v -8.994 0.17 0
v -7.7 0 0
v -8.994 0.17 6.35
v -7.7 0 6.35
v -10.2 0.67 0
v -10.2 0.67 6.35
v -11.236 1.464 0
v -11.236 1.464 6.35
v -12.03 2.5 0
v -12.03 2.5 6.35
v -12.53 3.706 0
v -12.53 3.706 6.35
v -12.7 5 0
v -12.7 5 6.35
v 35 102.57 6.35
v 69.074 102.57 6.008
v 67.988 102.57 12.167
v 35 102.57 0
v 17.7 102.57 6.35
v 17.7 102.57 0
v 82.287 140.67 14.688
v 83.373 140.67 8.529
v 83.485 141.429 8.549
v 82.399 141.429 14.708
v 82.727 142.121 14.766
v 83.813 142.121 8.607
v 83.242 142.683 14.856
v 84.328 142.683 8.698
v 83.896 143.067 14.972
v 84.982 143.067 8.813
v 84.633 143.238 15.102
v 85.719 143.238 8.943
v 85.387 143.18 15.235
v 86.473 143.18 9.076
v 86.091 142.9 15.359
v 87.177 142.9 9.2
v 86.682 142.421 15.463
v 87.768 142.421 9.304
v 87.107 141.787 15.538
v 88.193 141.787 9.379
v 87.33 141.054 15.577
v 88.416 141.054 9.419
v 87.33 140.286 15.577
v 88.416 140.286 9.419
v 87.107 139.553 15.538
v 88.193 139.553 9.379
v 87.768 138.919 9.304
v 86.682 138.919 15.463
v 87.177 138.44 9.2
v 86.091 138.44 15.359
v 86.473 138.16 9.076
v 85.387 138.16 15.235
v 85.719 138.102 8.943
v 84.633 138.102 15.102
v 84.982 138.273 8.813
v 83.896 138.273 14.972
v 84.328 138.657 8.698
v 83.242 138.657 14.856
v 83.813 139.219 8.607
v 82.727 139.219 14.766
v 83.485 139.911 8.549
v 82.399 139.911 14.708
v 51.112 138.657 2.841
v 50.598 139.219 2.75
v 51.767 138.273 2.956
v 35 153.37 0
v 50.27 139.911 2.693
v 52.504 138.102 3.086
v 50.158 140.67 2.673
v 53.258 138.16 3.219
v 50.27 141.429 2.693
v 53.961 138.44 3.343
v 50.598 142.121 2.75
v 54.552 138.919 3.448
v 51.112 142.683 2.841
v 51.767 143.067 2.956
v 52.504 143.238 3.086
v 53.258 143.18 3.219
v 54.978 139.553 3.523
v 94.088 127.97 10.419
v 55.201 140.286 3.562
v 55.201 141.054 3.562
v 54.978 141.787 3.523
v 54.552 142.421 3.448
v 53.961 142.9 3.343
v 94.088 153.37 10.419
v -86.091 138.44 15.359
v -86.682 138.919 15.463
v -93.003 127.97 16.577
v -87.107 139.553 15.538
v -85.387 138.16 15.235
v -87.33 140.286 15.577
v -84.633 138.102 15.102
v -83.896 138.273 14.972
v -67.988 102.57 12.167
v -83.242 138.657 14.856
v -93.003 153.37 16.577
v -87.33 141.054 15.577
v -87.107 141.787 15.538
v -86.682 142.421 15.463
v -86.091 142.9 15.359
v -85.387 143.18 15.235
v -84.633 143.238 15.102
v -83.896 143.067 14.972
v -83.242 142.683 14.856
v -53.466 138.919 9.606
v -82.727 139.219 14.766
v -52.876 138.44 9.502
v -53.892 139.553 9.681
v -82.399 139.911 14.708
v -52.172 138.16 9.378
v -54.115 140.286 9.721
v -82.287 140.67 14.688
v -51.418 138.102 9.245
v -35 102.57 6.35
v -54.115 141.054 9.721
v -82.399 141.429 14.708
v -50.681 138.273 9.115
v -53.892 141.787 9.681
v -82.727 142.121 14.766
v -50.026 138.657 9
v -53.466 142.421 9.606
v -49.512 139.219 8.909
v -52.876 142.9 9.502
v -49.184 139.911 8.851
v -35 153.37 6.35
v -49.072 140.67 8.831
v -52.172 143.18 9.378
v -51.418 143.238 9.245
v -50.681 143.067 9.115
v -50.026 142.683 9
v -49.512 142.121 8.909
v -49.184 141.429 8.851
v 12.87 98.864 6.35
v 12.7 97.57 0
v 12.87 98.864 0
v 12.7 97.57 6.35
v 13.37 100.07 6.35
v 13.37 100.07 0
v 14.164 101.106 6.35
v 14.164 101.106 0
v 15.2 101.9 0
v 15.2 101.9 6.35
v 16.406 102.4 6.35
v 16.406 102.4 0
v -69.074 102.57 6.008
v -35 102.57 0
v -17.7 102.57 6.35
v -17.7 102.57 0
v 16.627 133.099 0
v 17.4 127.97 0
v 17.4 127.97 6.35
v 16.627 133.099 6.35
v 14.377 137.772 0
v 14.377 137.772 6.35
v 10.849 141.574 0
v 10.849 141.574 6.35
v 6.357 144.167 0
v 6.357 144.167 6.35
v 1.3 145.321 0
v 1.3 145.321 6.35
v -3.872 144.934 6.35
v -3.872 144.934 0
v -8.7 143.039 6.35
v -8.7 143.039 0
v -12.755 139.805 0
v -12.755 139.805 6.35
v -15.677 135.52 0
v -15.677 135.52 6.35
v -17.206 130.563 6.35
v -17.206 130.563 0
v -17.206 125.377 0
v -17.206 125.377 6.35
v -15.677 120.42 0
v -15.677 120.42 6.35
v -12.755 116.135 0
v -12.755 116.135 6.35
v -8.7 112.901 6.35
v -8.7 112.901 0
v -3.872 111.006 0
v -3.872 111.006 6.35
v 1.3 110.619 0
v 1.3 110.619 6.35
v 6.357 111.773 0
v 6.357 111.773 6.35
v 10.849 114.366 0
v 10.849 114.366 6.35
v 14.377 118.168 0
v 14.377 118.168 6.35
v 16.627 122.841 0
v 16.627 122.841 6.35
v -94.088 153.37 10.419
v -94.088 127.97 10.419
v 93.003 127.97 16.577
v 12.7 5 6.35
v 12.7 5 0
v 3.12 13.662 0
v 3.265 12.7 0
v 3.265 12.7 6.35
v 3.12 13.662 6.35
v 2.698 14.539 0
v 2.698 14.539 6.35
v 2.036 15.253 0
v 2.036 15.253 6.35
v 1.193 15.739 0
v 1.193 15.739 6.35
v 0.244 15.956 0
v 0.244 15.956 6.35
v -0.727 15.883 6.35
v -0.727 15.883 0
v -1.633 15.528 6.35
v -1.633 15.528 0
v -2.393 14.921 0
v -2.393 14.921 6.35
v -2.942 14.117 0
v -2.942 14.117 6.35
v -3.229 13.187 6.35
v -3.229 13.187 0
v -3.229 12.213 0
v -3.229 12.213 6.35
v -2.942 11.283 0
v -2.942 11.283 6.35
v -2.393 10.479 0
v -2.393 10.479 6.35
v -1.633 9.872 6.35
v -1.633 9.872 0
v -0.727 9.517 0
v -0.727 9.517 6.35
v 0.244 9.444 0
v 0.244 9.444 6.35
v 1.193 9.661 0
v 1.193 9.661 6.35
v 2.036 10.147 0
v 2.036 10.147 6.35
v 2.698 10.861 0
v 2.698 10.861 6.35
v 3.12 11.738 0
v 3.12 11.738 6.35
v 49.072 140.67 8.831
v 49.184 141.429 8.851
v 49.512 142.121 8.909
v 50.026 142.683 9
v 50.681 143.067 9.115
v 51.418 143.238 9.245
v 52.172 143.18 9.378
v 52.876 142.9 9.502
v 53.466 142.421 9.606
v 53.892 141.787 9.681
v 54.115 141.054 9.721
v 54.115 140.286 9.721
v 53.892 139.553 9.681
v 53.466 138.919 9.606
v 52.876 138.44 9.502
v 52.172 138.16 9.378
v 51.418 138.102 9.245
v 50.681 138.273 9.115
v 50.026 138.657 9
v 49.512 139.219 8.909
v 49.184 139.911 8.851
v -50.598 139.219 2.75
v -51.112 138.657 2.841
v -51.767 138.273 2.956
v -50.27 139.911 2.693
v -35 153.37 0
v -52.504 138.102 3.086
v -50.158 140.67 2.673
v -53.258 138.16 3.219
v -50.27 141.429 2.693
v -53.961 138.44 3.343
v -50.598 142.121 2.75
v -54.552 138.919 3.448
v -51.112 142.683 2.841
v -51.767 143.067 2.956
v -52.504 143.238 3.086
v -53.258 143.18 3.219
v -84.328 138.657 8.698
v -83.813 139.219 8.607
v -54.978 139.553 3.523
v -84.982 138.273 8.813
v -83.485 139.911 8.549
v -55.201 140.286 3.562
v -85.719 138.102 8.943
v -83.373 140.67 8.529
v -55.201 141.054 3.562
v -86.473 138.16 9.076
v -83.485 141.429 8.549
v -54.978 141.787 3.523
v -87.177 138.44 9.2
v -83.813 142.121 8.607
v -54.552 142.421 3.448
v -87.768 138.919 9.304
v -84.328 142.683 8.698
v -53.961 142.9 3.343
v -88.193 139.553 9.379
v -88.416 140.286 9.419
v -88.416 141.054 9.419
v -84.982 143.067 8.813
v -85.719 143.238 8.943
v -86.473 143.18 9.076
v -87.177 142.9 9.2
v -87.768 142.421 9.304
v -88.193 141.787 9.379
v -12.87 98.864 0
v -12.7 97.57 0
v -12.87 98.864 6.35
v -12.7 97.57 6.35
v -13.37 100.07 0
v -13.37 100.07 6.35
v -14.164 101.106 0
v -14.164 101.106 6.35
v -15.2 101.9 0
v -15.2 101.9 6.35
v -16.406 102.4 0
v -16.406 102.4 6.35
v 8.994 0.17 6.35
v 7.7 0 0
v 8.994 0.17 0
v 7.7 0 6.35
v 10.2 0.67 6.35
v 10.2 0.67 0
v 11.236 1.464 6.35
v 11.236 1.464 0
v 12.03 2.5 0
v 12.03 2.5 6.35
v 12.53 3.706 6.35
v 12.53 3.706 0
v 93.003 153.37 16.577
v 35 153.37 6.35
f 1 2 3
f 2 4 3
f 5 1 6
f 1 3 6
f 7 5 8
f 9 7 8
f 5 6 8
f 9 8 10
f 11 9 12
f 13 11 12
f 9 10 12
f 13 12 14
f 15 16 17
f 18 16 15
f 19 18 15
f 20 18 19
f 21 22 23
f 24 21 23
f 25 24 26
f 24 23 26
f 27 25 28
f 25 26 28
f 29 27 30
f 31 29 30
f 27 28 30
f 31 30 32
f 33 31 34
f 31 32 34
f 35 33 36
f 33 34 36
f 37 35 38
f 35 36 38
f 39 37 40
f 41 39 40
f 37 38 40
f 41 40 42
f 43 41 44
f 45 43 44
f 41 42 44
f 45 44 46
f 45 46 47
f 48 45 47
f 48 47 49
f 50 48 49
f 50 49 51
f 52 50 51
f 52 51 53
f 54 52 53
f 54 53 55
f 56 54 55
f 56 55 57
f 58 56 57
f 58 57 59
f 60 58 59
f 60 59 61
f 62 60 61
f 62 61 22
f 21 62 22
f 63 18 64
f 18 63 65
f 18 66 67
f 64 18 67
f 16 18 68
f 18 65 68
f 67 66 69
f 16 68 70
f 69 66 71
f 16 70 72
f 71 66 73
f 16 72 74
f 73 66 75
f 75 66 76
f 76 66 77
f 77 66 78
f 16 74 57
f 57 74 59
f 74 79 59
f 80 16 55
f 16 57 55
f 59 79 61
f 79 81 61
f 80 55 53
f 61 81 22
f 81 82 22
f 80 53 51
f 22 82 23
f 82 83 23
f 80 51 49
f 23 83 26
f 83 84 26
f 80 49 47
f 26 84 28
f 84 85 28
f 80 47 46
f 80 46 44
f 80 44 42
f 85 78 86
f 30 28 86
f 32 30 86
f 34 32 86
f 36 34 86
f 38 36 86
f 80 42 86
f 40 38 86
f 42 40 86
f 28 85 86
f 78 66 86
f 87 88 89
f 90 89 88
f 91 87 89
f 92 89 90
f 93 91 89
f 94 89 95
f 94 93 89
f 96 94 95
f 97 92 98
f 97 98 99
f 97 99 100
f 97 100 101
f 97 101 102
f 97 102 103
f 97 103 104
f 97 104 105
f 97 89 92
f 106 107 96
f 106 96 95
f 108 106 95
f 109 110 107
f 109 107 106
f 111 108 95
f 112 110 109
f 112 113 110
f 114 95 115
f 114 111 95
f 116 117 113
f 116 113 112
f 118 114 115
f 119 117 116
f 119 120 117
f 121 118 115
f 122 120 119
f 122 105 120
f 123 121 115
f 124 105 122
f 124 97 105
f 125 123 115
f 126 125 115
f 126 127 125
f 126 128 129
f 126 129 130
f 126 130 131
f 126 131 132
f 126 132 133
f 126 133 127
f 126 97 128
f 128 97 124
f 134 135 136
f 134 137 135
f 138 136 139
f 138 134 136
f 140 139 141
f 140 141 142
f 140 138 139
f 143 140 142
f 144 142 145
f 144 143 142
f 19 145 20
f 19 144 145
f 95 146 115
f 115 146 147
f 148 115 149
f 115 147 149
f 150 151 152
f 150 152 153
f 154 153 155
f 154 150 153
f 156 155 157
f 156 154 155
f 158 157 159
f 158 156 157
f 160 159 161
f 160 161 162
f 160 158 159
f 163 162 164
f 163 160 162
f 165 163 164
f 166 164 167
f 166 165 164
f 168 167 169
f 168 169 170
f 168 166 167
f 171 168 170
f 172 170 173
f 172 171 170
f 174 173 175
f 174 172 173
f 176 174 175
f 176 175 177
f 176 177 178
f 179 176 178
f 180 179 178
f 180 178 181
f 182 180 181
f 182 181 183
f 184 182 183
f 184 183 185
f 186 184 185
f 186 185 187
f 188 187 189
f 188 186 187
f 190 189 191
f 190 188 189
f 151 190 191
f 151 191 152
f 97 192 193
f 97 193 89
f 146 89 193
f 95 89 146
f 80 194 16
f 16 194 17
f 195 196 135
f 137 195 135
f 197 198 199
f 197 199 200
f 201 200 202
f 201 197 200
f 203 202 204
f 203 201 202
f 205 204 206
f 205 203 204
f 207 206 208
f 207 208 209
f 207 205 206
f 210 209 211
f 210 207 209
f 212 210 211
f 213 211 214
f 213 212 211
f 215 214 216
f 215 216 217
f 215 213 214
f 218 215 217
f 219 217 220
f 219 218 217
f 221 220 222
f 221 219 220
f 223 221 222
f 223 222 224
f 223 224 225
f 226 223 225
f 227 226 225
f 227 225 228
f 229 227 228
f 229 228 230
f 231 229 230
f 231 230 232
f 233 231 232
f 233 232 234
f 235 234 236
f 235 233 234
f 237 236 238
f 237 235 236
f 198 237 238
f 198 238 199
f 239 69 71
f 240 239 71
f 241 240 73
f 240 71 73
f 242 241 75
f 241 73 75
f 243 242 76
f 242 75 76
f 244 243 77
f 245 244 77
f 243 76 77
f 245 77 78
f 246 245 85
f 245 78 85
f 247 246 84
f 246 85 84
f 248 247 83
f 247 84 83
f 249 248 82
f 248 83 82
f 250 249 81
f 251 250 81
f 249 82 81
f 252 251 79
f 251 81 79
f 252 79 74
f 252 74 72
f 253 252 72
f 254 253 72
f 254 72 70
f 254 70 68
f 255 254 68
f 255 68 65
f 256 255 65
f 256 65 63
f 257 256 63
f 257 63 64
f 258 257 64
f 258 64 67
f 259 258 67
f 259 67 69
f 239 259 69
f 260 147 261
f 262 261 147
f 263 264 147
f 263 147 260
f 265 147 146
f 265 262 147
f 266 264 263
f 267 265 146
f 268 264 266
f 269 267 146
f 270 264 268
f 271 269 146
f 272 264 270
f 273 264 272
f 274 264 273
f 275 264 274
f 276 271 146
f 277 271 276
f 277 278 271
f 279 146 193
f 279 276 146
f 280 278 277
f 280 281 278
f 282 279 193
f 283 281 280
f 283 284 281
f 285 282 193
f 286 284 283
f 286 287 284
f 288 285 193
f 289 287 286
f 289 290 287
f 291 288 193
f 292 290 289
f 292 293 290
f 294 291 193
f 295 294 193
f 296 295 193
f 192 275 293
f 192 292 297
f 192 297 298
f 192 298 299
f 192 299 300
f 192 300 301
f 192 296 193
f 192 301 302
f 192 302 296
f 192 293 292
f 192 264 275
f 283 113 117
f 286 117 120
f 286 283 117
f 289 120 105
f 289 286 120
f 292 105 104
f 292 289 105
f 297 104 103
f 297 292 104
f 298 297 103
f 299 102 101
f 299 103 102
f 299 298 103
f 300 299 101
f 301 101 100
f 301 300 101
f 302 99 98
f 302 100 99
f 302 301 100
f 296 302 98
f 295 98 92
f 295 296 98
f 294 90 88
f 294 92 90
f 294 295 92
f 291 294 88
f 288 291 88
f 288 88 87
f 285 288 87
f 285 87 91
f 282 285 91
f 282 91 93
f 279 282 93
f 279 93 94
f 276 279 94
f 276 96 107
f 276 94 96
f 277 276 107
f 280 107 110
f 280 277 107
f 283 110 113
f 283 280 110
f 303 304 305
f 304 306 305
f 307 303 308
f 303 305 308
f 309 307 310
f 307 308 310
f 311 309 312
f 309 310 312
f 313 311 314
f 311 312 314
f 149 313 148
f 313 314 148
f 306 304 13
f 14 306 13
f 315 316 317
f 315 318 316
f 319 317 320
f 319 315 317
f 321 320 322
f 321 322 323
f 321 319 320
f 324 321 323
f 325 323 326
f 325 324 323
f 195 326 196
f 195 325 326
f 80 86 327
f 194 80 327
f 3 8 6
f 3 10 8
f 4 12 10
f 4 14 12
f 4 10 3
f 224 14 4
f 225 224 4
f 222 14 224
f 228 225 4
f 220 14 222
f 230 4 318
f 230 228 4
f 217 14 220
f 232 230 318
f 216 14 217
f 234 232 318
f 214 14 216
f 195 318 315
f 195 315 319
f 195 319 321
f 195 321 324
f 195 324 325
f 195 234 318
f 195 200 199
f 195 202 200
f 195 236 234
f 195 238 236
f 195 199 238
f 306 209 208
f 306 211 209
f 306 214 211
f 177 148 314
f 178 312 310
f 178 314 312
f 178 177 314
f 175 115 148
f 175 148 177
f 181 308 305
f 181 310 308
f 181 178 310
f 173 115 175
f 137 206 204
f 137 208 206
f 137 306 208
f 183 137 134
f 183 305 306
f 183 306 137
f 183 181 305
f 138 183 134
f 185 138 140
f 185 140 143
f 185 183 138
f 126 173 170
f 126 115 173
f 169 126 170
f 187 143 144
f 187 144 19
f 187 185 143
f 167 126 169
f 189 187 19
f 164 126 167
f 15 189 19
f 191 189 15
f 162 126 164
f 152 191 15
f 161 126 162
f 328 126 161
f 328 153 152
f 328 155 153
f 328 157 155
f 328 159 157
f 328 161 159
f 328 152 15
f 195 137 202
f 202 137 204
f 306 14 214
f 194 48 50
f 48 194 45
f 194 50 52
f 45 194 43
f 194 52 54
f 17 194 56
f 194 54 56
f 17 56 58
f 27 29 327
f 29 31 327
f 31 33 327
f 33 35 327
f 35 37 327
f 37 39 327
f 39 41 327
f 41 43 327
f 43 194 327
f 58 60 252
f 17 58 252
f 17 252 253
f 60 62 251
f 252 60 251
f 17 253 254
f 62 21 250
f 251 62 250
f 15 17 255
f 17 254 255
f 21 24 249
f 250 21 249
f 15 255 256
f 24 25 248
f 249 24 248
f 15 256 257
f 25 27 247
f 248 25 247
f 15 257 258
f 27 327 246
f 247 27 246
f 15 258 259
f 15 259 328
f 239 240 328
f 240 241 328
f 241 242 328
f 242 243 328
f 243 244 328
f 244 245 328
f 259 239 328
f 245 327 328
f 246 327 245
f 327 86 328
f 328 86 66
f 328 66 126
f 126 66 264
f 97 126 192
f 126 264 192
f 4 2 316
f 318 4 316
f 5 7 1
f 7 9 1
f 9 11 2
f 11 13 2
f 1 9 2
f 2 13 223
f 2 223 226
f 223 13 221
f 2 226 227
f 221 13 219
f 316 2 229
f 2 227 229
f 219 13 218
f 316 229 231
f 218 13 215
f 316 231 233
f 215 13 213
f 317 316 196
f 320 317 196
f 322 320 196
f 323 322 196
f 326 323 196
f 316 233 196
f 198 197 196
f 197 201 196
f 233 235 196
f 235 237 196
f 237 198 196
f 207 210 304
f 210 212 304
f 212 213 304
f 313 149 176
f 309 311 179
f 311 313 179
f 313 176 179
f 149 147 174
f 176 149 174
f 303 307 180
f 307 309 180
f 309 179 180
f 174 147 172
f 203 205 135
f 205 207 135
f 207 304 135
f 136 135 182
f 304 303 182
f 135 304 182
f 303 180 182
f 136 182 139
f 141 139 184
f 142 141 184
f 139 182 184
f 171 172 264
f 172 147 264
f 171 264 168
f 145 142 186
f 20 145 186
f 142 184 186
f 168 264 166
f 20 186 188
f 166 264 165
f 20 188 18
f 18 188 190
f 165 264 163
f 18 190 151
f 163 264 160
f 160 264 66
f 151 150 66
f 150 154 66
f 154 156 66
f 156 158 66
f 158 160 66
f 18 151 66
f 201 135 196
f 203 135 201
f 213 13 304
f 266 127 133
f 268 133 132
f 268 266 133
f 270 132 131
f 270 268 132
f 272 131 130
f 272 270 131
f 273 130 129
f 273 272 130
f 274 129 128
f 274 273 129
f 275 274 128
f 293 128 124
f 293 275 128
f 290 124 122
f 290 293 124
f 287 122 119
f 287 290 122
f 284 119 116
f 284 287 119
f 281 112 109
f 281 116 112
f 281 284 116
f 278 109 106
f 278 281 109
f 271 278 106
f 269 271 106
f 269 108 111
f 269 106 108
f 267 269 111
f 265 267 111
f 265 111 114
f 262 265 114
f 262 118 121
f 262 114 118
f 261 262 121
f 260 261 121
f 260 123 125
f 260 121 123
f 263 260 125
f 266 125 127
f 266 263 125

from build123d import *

# Parameters (mm, degrees)
SKETCH1_R           = 17.4
SKETCH1_R_2         = 3.265
BOSS_EXTRUDE1_DEPTH = 6.35
FILLET2_R           = 5
BOSS_EXTRUDE2_DEPTH = 50.8
CUT_EXTRUDE4_DEPTH  = 181.692673495
SKETCH8_R           = 2.575
CUT_EXTRUDE6_DEPTH  = 10


with BuildPart() as part:
    # Sketch1 → Boss-Extrude1 (new body)
    with BuildSketch(Plane.XY):
        Polygon((-12.7, 0), (12.7, 0), (12.7, 102.57), (35, 102.57), (35, 153.37), (-35, 153.37), (-35, 102.57), (-12.7, 102.57), align=None)
        with Locations((0, 127.97)):
            Circle(SKETCH1_R, mode=Mode.SUBTRACT)
        with Locations((0, 12.7)):
            Circle(SKETCH1_R_2, mode=Mode.SUBTRACT)
    extrude(amount=BOSS_EXTRUDE1_DEPTH)

    # Fillet2
    fillet2_edges = [part.edges().sort_by_distance(p)[0] for p in [
        (12.7, 102.57, 3.175),
        (12.7, 0, 3.175),
        (-12.7, 0, 3.175),
        (-12.7, 102.57, 3.175),
    ]]
    fillet(fillet2_edges, radius=FILLET2_R)

    # Sketch2 → Boss-Extrude2 (add)
    with BuildSketch(Plane(origin=(0, 153.37, 0), x_dir=(1, 0, 0), z_dir=(0, 1, 0))):
        Polygon((-35, 0), (-94.088465181, -10.41889066), (-93.002551226, -16.577414731), (-35, -6.35), align=None)
    boss_extrude2 = extrude(amount=-BOSS_EXTRUDE2_DEPTH)

    # Sketch6 → Cut-Extrude4 (cut, symmetric)
    with BuildSketch(Plane(origin=(0.030534819, 0, 0.173171563), x_dir=(0.9848077530122079, 0, -0.17364817766693147), z_dir=(0.17364817766693147, 0, 0.9848077530122079))):
        Polygon((-94.468271355, 102.57), (-94.468271355, 127.97), (-69.068271355, 102.57), align=None)
    cut_extrude4 = extrude(amount=CUT_EXTRUDE4_DEPTH, both=True, mode=Mode.SUBTRACT)

    # Mirror1: Boss-Extrude2, Cut-Extrude4 across plane
    add(boss_extrude2.mirror(Plane(origin=(0, 0, 0), x_dir=(0, 0, 1), z_dir=(1, 0, 0))))
    add(cut_extrude4.mirror(Plane(origin=(0, 0, 0), x_dir=(0, 0, 1), z_dir=(1, 0, 0))), mode=Mode.SUBTRACT)

    # Sketch8 → Cut-Extrude6 (cut)
    with BuildSketch(Plane(origin=(1.055379136, 0, -5.985352508), x_dir=(-0.9848077530122079, 0, -0.17364817766693139), z_dir=(0.17364817766693139, 0, -0.9848077530122079))):
        with Locations((-86.162231322, 140.67)):
            Circle(SKETCH8_R)
        with Locations((-52.434701963, 140.67)):
            Circle(SKETCH8_R)
    cut_extrude6 = extrude(amount=-CUT_EXTRUDE6_DEPTH, mode=Mode.SUBTRACT)

    # Mirror2: Cut-Extrude6 across plane
    add(cut_extrude6.mirror(Plane(origin=(0, 0, 0), x_dir=(0, 0, 1), z_dir=(1, 0, 0))), mode=Mode.SUBTRACT)


solid = part.part
